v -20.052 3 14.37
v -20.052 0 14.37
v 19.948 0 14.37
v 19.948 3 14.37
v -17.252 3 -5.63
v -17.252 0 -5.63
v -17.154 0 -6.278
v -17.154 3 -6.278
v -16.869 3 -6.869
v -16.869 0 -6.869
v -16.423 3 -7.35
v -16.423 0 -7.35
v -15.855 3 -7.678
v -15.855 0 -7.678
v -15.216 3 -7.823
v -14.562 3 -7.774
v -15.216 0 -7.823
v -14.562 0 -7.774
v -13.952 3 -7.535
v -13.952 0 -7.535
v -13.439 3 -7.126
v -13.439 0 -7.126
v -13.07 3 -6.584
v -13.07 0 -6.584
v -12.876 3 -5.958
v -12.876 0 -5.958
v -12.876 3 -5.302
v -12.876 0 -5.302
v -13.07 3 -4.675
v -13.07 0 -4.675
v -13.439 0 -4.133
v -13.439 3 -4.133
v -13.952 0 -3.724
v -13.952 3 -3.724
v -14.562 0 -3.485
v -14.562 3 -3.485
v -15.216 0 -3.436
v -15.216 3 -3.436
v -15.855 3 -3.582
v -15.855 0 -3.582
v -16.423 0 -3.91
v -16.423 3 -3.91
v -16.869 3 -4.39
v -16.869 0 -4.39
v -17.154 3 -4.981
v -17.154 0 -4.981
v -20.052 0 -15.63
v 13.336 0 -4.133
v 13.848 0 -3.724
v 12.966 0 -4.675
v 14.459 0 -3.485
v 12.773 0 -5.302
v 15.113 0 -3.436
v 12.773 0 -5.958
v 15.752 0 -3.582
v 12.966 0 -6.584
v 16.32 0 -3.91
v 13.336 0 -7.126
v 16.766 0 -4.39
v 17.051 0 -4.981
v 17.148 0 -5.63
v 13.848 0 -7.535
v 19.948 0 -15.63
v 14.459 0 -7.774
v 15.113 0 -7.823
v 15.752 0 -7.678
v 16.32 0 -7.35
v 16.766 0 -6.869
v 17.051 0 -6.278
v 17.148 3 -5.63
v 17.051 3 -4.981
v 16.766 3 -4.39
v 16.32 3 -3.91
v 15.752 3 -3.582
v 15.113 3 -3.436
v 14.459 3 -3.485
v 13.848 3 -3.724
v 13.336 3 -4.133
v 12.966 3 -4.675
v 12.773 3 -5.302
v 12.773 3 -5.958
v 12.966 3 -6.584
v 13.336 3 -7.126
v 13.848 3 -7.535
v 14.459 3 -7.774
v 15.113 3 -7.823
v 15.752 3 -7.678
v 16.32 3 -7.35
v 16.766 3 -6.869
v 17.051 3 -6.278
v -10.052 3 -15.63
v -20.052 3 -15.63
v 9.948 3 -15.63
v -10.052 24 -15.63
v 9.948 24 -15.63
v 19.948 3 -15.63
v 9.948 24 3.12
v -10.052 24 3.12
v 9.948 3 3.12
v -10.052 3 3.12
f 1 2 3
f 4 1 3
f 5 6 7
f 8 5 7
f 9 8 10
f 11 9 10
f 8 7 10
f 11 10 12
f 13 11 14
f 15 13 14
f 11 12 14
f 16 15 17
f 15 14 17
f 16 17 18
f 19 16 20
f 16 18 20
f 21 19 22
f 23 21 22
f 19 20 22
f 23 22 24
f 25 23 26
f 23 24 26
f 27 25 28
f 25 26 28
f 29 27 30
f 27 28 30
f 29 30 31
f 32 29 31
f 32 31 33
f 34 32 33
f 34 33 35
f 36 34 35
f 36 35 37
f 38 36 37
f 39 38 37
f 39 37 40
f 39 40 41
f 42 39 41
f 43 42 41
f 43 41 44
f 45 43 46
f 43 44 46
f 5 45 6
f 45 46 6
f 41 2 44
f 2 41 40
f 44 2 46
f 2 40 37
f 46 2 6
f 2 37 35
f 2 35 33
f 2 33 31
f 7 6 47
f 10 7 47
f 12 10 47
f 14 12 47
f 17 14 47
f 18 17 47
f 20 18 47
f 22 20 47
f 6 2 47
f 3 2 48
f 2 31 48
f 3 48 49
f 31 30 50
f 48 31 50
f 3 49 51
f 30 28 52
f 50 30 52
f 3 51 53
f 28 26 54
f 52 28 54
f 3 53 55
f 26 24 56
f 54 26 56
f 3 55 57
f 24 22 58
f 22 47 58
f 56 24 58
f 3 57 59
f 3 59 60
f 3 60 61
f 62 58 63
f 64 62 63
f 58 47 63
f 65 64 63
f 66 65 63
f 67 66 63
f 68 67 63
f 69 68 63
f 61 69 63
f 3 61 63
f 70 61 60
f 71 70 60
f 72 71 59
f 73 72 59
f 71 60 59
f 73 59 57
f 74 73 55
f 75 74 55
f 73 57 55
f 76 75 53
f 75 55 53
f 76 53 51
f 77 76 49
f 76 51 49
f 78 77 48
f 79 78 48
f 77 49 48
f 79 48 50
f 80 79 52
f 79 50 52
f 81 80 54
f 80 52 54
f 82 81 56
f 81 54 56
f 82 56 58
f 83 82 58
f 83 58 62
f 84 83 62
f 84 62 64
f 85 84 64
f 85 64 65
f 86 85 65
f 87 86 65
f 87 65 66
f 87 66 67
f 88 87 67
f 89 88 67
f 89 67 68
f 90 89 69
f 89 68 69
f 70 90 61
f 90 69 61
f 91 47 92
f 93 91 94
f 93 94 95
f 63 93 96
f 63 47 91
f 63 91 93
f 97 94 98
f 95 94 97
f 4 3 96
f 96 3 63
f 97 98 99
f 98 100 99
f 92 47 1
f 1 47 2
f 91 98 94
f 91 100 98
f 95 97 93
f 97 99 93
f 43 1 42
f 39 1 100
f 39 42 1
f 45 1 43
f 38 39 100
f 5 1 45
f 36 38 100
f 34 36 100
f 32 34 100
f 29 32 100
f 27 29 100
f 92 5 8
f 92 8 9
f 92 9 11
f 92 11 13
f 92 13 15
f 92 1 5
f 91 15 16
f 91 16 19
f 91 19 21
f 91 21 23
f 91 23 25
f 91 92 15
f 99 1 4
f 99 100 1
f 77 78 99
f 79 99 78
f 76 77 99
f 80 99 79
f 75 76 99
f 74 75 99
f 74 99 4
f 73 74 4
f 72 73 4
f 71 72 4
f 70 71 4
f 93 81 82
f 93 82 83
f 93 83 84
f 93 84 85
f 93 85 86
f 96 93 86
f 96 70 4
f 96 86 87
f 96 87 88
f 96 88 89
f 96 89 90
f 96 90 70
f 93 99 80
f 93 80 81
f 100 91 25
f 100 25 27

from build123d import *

# Parameters (mm, degrees)
ESQUISSE3_W        = 10
ESQUISSE3_H        = 15
ESQUISSE3_H_2      = 10
ESQUISSE3_H_3      = 5
BOSS_EXTRU_1_DEPTH = 3
ESQUISSE4_W        = 10
ESQUISSE4_H        = 5
ESQUISSE4_H_2      = 3.75
BOSS_EXTRU_2_DEPTH = 17
ESQUISSE5_W        = 20
ESQUISSE5_H        = 18.75
BOSS_EXTRU_4_DEPTH = 4


with BuildPart() as part:
    # Esquisse3 → Boss.-Extru.1 (new body)
    with BuildSketch(Plane(origin=(0, 0, 0), x_dir=(1, 0, 0), z_dir=(0, 1, 0))):
        with Locations((-15.05164944, -6.870348765)):
            Rectangle(ESQUISSE3_W, ESQUISSE3_H)
        with Locations((14.94835056, -6.870348765)):
            Rectangle(ESQUISSE3_W, ESQUISSE3_H)
        with BuildLine():
            Line((-10.05164944, 5.629651235), (-10.05164944, 15.629651235))
            Line((-10.05164944, 15.629651235), (-20.05164944, 15.629651235))
            Line((-20.05164944, 15.629651235), (-20.05164944, 5.629651235))
            Line((-20.05164944, 5.629651235), (-17.25164944, 5.629651235))
            ThreePointArc((-17.25164944, 5.629651235), (-15.05164944, 7.829651235), (-12.85164944, 5.629651235))
            Line((-12.85164944, 5.629651235), (-10.05164944, 5.629651235))
        make_face()
        with BuildLine():
            Line((-10.05164944, 0.629651235), (-10.05164944, 5.629651235))
            Line((-10.05164944, 5.629651235), (-12.85164944, 5.629651235))
            ThreePointArc((-12.85164944, 5.629651235), (-15.05164944, 3.429651235), (-17.25164944, 5.629651235))
            Line((-17.25164944, 5.629651235), (-20.05164944, 5.629651235))
            Line((-20.05164944, 5.629651235), (-20.05164944, 0.629651235))
            Line((-20.05164944, 0.629651235), (-10.05164944, 0.629651235))
        make_face()
        with Locations((-5.05164944, 10.629651235)):
            Rectangle(ESQUISSE3_W, ESQUISSE3_H_2)
        with Locations((4.94835056, 10.629651235)):
            Rectangle(ESQUISSE3_W, ESQUISSE3_H_2)
        with BuildLine():
            Line((19.94835056, 15.629651235), (9.94835056, 15.629651235))
            Line((9.94835056, 15.629651235), (9.94835056, 5.629651235))
            Line((9.94835056, 5.629651235), (12.74835056, 5.629651235))
            ThreePointArc((12.74835056, 5.629651235), (14.94835056, 7.829651235), (17.14835056, 5.629651235))
            Line((17.14835056, 5.629651235), (19.94835056, 5.629651235))
            Line((19.94835056, 5.629651235), (19.94835056, 15.629651235))
        make_face()
        with BuildLine():
            Line((12.74835056, 5.629651235), (9.94835056, 5.629651235))
            Line((9.94835056, 5.629651235), (9.94835056, 0.629651235))
            Line((9.94835056, 0.629651235), (19.94835056, 0.629651235))
            Line((19.94835056, 0.629651235), (19.94835056, 5.629651235))
            Line((19.94835056, 5.629651235), (17.14835056, 5.629651235))
            ThreePointArc((17.14835056, 5.629651235), (14.94835056, 3.429651235), (12.74835056, 5.629651235))
        make_face()
        with Locations((4.94835056, -6.870348765)):
            Rectangle(ESQUISSE3_W, ESQUISSE3_H)
        with Locations((-5.05164944, -6.870348765)):
            Rectangle(ESQUISSE3_W, ESQUISSE3_H)
        with Locations((4.94835056, 3.129651235)):
            Rectangle(ESQUISSE3_W, ESQUISSE3_H_3)
        with Locations((-5.05164944, 3.129651235)):
            Rectangle(ESQUISSE3_W, ESQUISSE3_H_3)
    extrude(amount=BOSS_EXTRU_1_DEPTH)

    # Esquisse4 → Boss.-Extru.2 (add)
    with BuildSketch(Plane(origin=(0, 3, 0), x_dir=(1, 0, 0), z_dir=(0, 1, 0))):
        with Locations((-5.05164944, 3.129651235)):
            Rectangle(ESQUISSE4_W, ESQUISSE4_H)
        with Locations((-5.05164944, -1.245348765)):
            Rectangle(ESQUISSE4_W, ESQUISSE4_H_2)
        with Locations((4.94835056, -1.245348765)):
            Rectangle(ESQUISSE4_W, ESQUISSE4_H_2)
        with Locations((4.94835056, 3.129651235)):
            Rectangle(ESQUISSE4_W, ESQUISSE4_H)
        Polygon((-0.05164944, 15.629651235), (-0.05164944, 5.629651235), (9.94835056, 5.629651235), (9.94835056, 8.129651235), align=None)
        Polygon((-10.05164944, 8.129651235), (-10.05164944, 5.629651235), (-0.05164944, 5.629651235), (-0.05164944, 15.629651235), align=None)
        Polygon((-10.05164944, 15.629651235), (-10.05164944, 8.129651235), (-0.05164944, 15.629651235), align=None)
        Polygon((9.94835056, 15.629651235), (-0.05164944, 15.629651235), (9.94835056, 8.129651235), align=None)
    extrude(amount=BOSS_EXTRU_2_DEPTH)

    # Esquisse5 → Boss.-Extru.4 (add)
    with BuildSketch(Plane(origin=(0, 20, 0), x_dir=(1, 0, 0), z_dir=(0, 1, 0))):
        with Locations((-0.05164944, 6.254651235)):
            Rectangle(ESQUISSE5_W, ESQUISSE5_H)
    extrude(amount=BOSS_EXTRU_4_DEPTH)


solid = part.part
